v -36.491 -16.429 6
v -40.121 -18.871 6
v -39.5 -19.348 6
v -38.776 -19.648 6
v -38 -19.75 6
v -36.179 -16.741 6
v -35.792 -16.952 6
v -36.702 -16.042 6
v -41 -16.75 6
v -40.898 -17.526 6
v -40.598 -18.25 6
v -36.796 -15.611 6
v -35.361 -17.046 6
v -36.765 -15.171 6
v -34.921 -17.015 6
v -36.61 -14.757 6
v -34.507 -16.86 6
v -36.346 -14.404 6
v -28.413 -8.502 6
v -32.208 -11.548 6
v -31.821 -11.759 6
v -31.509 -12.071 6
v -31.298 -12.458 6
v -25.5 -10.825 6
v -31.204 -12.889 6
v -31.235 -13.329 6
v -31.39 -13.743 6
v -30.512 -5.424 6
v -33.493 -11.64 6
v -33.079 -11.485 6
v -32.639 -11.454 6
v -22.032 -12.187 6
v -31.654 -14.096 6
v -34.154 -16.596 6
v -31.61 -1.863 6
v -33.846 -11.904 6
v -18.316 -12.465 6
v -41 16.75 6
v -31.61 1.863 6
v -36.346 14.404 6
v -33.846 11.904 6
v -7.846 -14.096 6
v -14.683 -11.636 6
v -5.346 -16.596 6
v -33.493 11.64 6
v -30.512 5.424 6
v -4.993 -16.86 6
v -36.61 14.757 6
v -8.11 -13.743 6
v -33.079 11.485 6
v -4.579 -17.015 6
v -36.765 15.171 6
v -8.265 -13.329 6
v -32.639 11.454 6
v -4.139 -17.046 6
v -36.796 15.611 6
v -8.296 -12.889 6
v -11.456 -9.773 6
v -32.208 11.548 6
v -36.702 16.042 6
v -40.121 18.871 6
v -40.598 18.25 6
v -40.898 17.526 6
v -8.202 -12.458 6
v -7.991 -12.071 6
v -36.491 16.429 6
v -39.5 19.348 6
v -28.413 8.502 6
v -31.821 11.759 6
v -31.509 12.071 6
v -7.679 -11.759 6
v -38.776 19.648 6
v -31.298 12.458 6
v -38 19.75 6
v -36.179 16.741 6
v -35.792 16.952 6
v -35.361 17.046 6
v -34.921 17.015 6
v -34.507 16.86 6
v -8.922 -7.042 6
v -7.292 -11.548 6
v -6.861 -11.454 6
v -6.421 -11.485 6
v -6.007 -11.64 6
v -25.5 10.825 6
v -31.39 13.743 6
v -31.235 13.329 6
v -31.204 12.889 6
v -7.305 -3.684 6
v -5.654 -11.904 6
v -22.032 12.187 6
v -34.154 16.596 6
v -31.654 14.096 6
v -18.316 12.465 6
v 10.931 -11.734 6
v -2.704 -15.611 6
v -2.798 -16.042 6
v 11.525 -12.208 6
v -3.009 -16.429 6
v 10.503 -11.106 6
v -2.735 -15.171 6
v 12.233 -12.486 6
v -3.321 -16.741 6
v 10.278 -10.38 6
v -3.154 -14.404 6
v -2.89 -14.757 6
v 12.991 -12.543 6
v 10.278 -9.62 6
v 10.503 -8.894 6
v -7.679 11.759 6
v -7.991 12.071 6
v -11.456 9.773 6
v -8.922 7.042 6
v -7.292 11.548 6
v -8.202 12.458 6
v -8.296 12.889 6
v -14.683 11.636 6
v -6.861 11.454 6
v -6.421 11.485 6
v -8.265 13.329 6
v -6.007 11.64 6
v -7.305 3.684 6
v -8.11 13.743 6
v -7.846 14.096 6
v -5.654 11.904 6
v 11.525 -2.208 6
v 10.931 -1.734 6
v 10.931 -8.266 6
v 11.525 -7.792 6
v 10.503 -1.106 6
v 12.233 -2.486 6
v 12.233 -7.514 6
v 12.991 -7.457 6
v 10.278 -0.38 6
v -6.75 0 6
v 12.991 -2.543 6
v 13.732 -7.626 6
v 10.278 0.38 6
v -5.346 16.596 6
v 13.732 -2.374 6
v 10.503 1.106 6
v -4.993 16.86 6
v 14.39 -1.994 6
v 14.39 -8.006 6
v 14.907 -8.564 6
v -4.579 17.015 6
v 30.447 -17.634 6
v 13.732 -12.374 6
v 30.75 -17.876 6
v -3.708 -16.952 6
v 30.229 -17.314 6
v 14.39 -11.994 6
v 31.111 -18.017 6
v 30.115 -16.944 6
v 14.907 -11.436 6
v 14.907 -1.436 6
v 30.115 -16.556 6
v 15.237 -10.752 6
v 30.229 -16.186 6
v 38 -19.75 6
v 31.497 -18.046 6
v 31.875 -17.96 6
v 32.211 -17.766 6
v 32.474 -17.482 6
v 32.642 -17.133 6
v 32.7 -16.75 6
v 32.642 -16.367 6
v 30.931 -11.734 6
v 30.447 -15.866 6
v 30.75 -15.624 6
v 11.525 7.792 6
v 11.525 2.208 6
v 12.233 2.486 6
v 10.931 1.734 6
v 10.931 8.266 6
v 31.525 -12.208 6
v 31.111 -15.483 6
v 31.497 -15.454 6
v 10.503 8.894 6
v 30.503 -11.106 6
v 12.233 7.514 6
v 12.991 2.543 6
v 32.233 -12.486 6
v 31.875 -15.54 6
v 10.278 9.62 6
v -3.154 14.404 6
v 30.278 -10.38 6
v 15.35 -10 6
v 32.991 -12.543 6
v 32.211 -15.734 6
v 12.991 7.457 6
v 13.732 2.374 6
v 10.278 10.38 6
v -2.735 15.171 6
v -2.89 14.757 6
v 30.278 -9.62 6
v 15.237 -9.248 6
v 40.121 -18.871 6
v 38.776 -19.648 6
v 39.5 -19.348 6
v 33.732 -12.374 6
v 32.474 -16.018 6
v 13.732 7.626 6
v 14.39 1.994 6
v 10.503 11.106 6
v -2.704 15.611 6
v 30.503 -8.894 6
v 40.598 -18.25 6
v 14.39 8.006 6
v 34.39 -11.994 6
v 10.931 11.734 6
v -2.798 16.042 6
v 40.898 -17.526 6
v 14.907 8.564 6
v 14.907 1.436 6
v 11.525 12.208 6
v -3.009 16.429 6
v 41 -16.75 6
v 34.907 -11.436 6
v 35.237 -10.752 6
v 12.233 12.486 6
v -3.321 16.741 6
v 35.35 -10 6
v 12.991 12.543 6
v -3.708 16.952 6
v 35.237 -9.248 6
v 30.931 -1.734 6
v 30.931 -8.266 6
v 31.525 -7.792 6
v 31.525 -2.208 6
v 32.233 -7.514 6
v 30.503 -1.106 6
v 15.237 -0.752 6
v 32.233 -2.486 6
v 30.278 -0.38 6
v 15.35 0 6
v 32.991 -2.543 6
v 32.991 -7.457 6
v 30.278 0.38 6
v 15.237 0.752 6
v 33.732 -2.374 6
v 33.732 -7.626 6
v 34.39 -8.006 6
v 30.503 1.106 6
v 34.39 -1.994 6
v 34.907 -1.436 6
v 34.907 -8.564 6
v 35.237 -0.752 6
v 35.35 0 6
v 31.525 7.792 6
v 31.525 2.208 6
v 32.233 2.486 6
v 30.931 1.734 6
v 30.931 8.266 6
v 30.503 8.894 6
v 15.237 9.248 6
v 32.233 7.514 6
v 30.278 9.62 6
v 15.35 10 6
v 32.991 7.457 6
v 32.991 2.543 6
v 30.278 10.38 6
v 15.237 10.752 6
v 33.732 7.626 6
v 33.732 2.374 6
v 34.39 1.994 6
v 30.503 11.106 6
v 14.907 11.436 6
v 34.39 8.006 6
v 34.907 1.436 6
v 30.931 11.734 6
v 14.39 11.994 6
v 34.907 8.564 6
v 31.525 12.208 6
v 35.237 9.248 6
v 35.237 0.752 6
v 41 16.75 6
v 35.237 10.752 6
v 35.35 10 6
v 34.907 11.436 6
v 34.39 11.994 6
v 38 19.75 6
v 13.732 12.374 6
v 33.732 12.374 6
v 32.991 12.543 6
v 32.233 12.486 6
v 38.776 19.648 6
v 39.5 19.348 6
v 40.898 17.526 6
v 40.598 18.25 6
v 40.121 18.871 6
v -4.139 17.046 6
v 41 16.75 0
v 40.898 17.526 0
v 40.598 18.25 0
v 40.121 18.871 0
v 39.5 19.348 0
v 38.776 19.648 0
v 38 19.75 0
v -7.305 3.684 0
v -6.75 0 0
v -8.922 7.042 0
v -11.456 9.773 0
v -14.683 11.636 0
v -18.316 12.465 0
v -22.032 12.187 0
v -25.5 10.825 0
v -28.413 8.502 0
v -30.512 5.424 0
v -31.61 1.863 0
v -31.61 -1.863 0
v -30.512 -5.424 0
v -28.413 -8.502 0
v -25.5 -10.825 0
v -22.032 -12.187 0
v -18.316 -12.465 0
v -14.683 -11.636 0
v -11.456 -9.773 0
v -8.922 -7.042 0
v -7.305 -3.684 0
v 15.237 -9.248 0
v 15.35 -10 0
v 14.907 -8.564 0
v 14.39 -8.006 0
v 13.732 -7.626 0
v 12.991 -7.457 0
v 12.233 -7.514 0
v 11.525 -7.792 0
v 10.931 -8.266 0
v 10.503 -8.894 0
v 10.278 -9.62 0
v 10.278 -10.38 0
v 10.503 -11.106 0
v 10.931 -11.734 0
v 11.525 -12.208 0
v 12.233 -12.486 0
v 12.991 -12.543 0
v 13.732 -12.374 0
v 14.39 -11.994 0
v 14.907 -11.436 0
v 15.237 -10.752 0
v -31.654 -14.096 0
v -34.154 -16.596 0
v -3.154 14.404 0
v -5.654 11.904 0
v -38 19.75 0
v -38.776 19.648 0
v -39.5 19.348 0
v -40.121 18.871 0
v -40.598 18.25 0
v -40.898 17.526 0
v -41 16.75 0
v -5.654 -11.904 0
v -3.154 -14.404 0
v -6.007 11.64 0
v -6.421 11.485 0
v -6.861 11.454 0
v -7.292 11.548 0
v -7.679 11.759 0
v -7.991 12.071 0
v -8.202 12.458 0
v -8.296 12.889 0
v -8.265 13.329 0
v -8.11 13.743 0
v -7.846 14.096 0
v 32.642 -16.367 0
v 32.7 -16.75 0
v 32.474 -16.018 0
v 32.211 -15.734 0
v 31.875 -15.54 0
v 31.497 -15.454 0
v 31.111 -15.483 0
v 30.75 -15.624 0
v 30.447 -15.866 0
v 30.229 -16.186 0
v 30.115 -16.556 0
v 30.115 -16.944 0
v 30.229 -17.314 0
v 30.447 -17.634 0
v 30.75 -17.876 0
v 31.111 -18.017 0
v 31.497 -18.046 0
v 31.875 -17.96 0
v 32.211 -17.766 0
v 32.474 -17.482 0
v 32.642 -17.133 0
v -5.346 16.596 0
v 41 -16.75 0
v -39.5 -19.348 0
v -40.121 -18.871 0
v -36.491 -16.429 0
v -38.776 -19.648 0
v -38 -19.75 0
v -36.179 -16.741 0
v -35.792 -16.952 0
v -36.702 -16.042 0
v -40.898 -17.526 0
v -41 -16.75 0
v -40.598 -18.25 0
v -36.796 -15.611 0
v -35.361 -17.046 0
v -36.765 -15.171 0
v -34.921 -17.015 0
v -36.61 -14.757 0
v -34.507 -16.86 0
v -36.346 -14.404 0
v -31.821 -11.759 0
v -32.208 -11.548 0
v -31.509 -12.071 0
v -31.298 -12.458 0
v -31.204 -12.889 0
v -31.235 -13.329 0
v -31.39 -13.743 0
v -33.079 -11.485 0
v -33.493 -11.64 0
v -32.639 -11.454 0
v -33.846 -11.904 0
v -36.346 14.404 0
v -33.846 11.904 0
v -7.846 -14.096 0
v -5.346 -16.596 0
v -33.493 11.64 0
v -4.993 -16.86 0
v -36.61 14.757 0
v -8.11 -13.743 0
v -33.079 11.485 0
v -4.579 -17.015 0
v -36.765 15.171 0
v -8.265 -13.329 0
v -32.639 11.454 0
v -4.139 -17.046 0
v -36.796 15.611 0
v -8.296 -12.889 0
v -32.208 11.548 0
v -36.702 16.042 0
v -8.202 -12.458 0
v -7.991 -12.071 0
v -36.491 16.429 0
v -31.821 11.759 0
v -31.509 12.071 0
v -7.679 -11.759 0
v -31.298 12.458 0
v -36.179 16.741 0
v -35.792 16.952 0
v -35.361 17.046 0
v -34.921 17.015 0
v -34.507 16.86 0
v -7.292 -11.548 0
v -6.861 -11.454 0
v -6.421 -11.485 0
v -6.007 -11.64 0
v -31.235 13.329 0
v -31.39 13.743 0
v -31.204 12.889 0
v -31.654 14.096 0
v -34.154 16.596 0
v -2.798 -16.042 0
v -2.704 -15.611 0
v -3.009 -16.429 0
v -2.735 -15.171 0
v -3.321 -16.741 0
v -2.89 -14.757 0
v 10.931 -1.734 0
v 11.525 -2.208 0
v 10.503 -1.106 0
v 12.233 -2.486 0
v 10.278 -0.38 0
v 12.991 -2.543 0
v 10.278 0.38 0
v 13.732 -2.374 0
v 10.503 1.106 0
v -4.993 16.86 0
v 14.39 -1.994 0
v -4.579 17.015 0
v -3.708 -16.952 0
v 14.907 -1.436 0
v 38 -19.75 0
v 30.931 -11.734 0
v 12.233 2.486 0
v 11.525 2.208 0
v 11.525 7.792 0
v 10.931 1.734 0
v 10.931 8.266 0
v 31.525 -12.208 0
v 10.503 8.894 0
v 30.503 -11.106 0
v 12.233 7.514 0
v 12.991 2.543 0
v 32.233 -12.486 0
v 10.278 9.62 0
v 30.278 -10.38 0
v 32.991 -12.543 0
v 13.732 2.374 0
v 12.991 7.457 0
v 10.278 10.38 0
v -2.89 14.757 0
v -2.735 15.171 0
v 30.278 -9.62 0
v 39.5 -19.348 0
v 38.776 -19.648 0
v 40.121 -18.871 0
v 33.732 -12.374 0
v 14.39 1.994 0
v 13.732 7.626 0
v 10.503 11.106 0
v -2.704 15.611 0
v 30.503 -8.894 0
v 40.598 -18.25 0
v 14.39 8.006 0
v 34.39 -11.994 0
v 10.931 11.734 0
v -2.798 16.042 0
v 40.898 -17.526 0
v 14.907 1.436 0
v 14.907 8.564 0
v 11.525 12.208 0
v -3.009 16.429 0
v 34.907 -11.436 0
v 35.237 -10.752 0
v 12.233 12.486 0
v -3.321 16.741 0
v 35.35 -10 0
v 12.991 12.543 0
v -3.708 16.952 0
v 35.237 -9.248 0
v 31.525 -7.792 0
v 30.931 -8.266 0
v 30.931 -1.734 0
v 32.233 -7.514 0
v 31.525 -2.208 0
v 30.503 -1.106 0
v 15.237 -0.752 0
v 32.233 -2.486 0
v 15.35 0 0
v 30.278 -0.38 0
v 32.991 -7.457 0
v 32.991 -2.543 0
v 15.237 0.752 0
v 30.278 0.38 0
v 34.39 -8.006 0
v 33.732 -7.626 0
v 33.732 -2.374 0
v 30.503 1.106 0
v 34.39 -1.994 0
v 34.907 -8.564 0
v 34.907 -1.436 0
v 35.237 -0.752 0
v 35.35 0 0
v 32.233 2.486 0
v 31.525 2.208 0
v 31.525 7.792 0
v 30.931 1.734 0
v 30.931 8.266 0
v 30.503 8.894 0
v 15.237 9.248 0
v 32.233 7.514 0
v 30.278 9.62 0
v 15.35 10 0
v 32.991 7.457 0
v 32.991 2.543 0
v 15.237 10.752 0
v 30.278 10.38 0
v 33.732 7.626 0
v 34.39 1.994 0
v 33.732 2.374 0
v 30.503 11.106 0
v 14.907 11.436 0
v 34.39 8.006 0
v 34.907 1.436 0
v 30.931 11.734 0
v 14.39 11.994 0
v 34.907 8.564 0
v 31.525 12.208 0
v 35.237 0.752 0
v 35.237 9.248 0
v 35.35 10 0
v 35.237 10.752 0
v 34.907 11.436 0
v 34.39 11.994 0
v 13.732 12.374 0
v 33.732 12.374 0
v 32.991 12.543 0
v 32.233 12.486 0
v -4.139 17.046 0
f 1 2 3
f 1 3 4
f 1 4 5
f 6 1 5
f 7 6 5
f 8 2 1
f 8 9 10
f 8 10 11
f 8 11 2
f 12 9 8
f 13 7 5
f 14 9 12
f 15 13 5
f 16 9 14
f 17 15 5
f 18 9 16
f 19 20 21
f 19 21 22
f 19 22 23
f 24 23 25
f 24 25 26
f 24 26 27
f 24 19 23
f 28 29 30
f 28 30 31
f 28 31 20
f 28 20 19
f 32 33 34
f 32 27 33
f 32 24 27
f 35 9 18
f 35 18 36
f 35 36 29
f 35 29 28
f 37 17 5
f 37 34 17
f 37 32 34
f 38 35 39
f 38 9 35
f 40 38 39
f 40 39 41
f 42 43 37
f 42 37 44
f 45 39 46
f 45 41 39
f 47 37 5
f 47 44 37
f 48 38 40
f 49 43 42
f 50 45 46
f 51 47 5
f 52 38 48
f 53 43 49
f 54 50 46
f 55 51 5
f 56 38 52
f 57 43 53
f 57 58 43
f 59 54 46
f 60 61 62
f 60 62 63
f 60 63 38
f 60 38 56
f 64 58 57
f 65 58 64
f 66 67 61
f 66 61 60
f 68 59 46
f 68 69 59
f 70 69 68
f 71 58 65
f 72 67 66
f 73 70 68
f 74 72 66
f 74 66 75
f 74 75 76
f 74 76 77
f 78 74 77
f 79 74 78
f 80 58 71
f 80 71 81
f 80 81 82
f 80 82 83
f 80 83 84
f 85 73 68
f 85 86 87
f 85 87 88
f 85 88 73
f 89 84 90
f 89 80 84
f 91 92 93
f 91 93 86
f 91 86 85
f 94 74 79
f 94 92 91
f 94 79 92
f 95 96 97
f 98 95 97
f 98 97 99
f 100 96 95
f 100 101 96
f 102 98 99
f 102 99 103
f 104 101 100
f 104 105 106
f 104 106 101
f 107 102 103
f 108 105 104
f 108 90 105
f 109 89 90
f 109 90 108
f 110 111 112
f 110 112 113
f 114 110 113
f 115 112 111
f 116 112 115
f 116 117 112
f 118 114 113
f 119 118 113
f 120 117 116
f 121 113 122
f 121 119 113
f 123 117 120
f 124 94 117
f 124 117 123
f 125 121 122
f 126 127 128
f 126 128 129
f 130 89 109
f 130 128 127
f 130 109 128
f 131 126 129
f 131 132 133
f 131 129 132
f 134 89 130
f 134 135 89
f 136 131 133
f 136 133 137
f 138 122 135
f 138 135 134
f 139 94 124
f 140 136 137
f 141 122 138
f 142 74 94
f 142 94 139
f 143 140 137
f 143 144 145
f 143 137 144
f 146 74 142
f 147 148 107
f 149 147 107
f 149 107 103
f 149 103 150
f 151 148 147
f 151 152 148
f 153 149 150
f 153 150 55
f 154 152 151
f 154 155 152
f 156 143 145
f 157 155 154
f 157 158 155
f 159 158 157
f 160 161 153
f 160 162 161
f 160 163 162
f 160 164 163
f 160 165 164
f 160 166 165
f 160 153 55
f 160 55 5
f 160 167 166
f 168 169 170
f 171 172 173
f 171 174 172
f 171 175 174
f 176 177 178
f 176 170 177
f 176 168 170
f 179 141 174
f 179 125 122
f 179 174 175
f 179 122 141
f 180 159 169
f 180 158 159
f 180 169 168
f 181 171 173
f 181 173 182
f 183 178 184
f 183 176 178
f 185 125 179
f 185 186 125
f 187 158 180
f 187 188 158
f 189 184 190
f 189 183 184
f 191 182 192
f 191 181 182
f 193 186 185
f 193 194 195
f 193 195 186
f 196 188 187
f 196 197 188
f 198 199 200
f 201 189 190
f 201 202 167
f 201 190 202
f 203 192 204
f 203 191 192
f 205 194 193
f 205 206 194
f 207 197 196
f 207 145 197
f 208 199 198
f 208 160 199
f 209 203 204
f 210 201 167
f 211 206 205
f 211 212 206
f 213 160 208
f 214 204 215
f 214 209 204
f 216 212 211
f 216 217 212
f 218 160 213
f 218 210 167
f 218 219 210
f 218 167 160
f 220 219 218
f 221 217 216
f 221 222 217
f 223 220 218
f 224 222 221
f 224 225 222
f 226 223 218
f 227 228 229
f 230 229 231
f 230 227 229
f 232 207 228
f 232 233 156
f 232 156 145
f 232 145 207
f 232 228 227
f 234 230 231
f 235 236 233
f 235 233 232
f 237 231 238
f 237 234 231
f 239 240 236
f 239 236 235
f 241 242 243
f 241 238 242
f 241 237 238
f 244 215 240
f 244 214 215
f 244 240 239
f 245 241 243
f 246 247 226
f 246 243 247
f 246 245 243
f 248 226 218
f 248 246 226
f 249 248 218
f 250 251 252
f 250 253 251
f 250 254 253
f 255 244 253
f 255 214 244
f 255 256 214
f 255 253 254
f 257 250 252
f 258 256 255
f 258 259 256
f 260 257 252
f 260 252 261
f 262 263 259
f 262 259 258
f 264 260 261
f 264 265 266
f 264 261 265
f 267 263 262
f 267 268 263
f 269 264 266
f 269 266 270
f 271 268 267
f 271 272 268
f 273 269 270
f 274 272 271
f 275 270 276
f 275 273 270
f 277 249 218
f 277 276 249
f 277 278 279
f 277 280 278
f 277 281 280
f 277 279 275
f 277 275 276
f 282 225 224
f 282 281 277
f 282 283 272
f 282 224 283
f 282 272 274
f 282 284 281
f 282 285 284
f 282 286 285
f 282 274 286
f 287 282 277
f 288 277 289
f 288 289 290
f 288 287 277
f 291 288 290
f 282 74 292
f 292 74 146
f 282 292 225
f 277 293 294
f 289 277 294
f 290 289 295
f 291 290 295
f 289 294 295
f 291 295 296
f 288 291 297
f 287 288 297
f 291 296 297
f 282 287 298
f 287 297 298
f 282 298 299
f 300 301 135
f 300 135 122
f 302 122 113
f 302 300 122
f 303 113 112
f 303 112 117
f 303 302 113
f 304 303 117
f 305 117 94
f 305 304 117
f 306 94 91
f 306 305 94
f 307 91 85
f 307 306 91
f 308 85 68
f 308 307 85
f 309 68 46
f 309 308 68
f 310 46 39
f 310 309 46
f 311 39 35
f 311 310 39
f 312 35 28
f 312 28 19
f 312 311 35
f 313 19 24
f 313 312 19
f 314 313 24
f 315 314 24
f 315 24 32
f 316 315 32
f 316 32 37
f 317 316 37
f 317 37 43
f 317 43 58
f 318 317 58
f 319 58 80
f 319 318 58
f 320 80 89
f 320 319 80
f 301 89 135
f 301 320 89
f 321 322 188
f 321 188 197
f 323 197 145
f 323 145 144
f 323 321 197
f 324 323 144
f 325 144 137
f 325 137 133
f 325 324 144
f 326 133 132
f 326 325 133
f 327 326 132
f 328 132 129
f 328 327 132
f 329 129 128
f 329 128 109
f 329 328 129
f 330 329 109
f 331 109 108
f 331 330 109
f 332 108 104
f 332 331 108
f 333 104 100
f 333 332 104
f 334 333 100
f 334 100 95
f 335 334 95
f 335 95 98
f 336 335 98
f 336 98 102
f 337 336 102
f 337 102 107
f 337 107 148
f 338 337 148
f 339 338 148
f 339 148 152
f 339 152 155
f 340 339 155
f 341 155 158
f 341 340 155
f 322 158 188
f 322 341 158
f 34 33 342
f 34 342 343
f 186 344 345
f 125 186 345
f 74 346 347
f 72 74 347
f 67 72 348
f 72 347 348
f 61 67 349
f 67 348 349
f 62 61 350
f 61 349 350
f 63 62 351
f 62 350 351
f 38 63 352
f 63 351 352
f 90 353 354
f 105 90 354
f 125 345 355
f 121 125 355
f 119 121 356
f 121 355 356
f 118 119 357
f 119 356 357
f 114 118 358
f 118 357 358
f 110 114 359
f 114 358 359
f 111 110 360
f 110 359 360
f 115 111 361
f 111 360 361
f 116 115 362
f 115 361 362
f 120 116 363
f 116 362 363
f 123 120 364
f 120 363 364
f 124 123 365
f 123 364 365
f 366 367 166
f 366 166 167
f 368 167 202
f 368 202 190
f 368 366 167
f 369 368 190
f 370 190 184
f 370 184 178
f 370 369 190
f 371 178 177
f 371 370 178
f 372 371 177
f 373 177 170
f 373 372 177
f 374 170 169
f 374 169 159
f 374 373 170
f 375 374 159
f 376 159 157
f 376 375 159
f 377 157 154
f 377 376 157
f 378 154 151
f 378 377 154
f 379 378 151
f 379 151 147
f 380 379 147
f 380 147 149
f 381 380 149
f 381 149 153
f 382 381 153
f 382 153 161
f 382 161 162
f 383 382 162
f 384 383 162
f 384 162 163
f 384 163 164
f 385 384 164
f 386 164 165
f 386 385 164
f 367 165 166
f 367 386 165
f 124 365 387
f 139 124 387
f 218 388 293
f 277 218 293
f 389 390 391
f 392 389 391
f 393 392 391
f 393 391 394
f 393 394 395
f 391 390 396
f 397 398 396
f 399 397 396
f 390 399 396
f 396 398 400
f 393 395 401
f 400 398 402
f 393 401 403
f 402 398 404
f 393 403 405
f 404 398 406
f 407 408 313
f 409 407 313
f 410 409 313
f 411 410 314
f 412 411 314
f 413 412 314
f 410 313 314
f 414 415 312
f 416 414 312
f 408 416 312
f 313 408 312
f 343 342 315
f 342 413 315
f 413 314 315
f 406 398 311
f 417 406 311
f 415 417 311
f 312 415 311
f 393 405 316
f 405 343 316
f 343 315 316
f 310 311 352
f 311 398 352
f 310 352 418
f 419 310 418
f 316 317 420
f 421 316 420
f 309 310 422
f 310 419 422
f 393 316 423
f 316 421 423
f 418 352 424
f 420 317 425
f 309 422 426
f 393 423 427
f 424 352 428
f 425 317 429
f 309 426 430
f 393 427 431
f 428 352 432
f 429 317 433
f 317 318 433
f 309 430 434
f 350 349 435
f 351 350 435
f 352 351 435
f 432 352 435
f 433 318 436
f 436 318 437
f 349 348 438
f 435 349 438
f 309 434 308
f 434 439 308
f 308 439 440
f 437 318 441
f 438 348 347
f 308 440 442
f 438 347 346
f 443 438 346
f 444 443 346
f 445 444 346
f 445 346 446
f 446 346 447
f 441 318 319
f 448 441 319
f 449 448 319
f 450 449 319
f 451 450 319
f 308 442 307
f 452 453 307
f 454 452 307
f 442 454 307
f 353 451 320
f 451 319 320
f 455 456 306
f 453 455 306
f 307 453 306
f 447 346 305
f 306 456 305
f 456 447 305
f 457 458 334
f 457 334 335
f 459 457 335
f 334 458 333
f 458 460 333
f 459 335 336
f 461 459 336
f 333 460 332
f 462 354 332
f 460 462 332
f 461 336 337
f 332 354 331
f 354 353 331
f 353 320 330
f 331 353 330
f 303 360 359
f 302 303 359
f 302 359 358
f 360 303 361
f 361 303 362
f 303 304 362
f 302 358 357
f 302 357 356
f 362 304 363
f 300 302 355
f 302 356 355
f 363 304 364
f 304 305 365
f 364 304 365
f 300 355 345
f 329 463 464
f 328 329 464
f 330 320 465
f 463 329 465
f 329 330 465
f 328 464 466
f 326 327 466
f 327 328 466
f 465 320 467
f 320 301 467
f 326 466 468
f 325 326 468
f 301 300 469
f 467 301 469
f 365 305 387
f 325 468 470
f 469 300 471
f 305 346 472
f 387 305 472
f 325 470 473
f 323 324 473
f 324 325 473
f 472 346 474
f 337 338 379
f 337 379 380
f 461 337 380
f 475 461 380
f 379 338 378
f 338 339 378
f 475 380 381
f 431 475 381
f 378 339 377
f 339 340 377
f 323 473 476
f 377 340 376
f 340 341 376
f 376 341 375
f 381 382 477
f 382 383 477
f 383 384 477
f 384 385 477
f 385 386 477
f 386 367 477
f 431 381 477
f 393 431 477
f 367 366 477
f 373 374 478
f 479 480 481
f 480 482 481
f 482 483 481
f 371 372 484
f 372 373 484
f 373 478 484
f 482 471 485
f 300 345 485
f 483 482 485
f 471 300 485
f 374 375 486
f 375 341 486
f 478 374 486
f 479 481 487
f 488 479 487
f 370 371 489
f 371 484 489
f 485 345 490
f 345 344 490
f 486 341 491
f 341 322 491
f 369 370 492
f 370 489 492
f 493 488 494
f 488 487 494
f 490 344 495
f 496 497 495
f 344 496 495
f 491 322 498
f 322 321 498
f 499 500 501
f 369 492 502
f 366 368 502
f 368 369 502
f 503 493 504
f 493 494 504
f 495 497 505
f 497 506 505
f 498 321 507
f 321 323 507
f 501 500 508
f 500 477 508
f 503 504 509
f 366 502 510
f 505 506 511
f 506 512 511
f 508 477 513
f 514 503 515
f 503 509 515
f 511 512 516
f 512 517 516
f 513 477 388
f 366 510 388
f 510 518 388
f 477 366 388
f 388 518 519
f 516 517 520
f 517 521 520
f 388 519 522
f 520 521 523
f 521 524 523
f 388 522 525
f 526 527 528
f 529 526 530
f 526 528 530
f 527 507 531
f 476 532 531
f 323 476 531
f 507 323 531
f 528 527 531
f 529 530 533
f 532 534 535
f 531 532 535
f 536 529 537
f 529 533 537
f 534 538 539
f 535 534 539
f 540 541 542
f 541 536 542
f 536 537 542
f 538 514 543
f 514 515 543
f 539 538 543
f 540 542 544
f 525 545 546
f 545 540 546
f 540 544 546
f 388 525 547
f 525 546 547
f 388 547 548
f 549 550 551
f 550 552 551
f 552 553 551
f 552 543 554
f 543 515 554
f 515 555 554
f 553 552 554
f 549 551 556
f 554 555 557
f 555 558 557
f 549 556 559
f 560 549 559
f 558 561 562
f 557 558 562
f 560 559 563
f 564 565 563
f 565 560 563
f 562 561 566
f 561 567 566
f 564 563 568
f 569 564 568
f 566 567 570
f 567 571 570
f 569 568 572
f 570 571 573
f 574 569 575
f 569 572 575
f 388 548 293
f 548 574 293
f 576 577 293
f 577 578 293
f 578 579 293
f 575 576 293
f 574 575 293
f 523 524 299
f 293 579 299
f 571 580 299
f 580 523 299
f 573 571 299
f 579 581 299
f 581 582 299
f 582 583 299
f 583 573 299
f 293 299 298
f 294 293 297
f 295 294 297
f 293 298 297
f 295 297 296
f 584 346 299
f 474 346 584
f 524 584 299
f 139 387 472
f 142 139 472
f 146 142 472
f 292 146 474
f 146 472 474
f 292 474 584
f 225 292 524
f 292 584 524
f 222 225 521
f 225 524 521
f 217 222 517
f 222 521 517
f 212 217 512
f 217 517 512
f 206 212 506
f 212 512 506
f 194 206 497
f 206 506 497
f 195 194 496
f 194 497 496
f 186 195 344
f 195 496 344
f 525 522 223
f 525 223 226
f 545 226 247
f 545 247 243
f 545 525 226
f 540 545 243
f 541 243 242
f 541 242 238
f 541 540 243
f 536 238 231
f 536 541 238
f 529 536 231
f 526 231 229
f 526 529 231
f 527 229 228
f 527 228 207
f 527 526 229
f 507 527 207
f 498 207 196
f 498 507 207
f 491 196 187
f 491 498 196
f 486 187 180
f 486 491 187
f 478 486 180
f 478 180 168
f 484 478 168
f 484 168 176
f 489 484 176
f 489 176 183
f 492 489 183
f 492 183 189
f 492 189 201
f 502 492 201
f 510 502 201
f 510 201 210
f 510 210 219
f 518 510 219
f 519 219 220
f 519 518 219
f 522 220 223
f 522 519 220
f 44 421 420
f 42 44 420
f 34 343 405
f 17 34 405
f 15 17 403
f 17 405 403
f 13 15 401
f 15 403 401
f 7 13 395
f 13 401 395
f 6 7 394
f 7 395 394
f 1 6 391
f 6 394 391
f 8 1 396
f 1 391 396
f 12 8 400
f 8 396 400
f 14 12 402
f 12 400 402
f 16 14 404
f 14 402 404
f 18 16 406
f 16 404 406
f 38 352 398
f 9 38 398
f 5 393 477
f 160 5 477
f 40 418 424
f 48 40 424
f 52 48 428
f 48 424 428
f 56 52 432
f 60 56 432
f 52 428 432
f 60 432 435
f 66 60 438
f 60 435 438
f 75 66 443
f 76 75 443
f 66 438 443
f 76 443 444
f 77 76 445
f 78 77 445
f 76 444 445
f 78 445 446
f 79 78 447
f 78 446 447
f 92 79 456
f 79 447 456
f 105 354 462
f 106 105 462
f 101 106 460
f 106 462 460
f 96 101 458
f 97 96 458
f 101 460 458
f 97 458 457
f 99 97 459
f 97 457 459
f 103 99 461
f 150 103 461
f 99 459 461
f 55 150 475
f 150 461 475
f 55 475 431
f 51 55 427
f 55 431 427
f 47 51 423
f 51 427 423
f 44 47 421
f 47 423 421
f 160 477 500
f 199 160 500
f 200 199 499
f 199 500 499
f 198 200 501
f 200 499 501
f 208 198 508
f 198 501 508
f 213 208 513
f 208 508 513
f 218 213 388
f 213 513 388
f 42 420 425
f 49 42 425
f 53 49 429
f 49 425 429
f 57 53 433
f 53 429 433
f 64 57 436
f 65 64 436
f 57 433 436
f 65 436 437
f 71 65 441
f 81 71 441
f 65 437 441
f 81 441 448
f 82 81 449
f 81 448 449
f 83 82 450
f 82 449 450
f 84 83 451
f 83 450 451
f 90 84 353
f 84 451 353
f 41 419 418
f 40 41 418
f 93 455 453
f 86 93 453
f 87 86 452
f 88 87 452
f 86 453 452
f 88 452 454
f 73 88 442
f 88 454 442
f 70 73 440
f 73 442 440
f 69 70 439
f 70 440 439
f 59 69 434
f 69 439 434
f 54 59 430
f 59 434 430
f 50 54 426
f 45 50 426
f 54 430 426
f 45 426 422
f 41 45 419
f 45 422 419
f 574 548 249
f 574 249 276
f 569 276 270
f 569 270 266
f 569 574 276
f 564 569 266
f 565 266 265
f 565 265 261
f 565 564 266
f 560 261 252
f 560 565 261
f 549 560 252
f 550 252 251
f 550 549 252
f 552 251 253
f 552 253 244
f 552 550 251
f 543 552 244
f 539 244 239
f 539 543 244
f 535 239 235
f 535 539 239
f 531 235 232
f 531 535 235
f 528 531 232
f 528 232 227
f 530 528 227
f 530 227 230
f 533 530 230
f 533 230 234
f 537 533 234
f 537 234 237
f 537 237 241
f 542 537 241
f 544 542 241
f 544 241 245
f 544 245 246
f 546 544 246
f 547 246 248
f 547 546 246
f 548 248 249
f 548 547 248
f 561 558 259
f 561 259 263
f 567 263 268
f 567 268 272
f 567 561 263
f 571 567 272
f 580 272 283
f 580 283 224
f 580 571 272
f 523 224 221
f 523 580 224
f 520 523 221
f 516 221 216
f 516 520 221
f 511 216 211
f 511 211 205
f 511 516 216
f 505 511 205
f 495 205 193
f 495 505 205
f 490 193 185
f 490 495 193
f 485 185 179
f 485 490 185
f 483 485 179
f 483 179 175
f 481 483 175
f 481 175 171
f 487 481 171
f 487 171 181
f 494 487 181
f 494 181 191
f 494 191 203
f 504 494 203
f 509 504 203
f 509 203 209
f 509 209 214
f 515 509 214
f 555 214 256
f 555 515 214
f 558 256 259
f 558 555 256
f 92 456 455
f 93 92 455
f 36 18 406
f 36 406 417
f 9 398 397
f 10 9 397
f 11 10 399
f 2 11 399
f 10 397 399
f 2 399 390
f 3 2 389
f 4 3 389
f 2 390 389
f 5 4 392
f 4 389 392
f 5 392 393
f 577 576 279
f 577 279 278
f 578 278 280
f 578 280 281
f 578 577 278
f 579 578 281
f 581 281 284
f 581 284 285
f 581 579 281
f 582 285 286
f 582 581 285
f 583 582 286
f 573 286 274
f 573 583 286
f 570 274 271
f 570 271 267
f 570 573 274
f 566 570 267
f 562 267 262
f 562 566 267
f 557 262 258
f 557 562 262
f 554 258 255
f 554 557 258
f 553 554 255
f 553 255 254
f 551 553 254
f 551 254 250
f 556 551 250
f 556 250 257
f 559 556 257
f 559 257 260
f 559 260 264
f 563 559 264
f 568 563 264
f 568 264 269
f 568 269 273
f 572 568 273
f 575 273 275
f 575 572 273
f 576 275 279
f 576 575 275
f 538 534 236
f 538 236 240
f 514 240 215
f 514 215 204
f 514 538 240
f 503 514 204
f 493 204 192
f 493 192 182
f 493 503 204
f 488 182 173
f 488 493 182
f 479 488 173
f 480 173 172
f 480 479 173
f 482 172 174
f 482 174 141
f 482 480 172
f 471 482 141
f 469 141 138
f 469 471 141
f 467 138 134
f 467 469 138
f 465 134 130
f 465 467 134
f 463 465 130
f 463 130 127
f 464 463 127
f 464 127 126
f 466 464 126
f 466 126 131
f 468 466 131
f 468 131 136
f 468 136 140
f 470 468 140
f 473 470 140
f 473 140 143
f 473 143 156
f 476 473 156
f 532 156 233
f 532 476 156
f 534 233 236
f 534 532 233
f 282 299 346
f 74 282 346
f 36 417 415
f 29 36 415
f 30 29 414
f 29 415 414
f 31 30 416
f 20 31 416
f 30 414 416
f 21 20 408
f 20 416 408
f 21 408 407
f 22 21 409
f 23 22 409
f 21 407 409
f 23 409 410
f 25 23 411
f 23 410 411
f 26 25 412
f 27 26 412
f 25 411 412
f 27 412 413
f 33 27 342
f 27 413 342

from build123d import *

# Parameters (mm, degrees)
F0_R     = 12.5
F0_R_2   = 2.55
F0_R_3   = 1.3
F1_DEPTH = 6


# Not quite as in the source:
# - ends of sketch curves that miss each other by under 0.0002 mm in the source are joined


with BuildPart() as f1:
    # F0 (on Top) → F1 (new body)
    with BuildSketch(Plane.XY):
        with BuildLine():
            Line((38, 19.75), (-38, 19.75))
            ThreePointArc((-38, 19.75), (-40.1213203436, 18.8713203436), (-41, 16.75))
            Line((-41, 16.75), (-41, -16.75))
            ThreePointArc((-41, -16.75), (-40.1213203436, -18.8713203436), (-38, -19.75))
            Line((-38, -19.75), (38, -19.75))
            ThreePointArc((38, -19.75), (40.1213203436, -18.8713203436), (41, -16.75))
            Line((41, -16.75), (41, 16.75))
            ThreePointArc((41, 16.75), (40.1213203436, 18.8713203436), (38, 19.75))
        make_face()
        with BuildLine():
            ThreePointArc((-34.1539839892, -16.5960150108), (-36.3460155108, -16.5960155108), (-36.3460150108, -14.4039839892))
            Line((-36.346015, -14.403984), (-33.846015, -11.903984))
            ThreePointArc((-33.8460150108, -11.9039839892), (-31.6539844892, -11.9039844892), (-31.6539839892, -14.0960150108))
            Line((-31.653984, -14.096015), (-34.153984, -16.596015))
        make_face(mode=Mode.SUBTRACT)
        with BuildLine():
            ThreePointArc((-3.1539844892, -14.4039844892), (-3.1539844892, -16.5960155108), (-5.3460155108, -16.5960155108))
            Line((-5.3460155108, -16.5960155108), (-7.846015, -14.096015))
            ThreePointArc((-7.846015, -14.096015), (-7.8460155108, -11.9039844892), (-5.6539844892, -11.9039844892))
            Line((-5.6539844892, -11.9039844892), (-3.1539844892, -14.4039844892))
        make_face(mode=Mode.SUBTRACT)
        with Locations((-19.25, 0)):
            Circle(F0_R, mode=Mode.SUBTRACT)
        with Locations((12.8, -10)):
            Circle(F0_R_2, mode=Mode.SUBTRACT)
        with Locations((31.4, -16.75)):
            Circle(F0_R_3, mode=Mode.SUBTRACT)
        with Locations((32.8, -10)):
            Circle(F0_R_2, mode=Mode.SUBTRACT)
        with Locations((12.8, 0)):
            Circle(F0_R_2, mode=Mode.SUBTRACT)
        with Locations((32.8, 0)):
            Circle(F0_R_2, mode=Mode.SUBTRACT)
        with BuildLine():
            ThreePointArc((-31.6539844892, 14.0960155108), (-31.6539844892, 11.9039844892), (-33.8460155108, 11.9039844892))
            Line((-33.8460155108, 11.9039844892), (-36.346015, 14.403985))
            ThreePointArc((-36.346015, 14.403985), (-36.3460155108, 16.5960155108), (-34.1539844892, 16.5960155108))
            Line((-34.1539844892, 16.5960155108), (-31.6539844892, 14.0960155108))
        make_face(mode=Mode.SUBTRACT)
        with BuildLine():
            ThreePointArc((-5.3460150108, 16.5960160108), (-3.1539844892, 16.5960155108), (-3.1539839892, 14.4039849892))
            Line((-3.153984, 14.403985), (-5.653984, 11.903985))
            ThreePointArc((-5.6539839892, 11.9039849892), (-7.8460155108, 11.9039844892), (-7.8460150108, 14.0960160108))
            Line((-7.846015, 14.096016), (-5.346015, 16.596016))
        make_face(mode=Mode.SUBTRACT)
        with Locations((12.8, 10)):
            Circle(F0_R_2, mode=Mode.SUBTRACT)
        with Locations((32.8, 10)):
            Circle(F0_R_2, mode=Mode.SUBTRACT)
    extrude(amount=F1_DEPTH)


solid = f1.part
